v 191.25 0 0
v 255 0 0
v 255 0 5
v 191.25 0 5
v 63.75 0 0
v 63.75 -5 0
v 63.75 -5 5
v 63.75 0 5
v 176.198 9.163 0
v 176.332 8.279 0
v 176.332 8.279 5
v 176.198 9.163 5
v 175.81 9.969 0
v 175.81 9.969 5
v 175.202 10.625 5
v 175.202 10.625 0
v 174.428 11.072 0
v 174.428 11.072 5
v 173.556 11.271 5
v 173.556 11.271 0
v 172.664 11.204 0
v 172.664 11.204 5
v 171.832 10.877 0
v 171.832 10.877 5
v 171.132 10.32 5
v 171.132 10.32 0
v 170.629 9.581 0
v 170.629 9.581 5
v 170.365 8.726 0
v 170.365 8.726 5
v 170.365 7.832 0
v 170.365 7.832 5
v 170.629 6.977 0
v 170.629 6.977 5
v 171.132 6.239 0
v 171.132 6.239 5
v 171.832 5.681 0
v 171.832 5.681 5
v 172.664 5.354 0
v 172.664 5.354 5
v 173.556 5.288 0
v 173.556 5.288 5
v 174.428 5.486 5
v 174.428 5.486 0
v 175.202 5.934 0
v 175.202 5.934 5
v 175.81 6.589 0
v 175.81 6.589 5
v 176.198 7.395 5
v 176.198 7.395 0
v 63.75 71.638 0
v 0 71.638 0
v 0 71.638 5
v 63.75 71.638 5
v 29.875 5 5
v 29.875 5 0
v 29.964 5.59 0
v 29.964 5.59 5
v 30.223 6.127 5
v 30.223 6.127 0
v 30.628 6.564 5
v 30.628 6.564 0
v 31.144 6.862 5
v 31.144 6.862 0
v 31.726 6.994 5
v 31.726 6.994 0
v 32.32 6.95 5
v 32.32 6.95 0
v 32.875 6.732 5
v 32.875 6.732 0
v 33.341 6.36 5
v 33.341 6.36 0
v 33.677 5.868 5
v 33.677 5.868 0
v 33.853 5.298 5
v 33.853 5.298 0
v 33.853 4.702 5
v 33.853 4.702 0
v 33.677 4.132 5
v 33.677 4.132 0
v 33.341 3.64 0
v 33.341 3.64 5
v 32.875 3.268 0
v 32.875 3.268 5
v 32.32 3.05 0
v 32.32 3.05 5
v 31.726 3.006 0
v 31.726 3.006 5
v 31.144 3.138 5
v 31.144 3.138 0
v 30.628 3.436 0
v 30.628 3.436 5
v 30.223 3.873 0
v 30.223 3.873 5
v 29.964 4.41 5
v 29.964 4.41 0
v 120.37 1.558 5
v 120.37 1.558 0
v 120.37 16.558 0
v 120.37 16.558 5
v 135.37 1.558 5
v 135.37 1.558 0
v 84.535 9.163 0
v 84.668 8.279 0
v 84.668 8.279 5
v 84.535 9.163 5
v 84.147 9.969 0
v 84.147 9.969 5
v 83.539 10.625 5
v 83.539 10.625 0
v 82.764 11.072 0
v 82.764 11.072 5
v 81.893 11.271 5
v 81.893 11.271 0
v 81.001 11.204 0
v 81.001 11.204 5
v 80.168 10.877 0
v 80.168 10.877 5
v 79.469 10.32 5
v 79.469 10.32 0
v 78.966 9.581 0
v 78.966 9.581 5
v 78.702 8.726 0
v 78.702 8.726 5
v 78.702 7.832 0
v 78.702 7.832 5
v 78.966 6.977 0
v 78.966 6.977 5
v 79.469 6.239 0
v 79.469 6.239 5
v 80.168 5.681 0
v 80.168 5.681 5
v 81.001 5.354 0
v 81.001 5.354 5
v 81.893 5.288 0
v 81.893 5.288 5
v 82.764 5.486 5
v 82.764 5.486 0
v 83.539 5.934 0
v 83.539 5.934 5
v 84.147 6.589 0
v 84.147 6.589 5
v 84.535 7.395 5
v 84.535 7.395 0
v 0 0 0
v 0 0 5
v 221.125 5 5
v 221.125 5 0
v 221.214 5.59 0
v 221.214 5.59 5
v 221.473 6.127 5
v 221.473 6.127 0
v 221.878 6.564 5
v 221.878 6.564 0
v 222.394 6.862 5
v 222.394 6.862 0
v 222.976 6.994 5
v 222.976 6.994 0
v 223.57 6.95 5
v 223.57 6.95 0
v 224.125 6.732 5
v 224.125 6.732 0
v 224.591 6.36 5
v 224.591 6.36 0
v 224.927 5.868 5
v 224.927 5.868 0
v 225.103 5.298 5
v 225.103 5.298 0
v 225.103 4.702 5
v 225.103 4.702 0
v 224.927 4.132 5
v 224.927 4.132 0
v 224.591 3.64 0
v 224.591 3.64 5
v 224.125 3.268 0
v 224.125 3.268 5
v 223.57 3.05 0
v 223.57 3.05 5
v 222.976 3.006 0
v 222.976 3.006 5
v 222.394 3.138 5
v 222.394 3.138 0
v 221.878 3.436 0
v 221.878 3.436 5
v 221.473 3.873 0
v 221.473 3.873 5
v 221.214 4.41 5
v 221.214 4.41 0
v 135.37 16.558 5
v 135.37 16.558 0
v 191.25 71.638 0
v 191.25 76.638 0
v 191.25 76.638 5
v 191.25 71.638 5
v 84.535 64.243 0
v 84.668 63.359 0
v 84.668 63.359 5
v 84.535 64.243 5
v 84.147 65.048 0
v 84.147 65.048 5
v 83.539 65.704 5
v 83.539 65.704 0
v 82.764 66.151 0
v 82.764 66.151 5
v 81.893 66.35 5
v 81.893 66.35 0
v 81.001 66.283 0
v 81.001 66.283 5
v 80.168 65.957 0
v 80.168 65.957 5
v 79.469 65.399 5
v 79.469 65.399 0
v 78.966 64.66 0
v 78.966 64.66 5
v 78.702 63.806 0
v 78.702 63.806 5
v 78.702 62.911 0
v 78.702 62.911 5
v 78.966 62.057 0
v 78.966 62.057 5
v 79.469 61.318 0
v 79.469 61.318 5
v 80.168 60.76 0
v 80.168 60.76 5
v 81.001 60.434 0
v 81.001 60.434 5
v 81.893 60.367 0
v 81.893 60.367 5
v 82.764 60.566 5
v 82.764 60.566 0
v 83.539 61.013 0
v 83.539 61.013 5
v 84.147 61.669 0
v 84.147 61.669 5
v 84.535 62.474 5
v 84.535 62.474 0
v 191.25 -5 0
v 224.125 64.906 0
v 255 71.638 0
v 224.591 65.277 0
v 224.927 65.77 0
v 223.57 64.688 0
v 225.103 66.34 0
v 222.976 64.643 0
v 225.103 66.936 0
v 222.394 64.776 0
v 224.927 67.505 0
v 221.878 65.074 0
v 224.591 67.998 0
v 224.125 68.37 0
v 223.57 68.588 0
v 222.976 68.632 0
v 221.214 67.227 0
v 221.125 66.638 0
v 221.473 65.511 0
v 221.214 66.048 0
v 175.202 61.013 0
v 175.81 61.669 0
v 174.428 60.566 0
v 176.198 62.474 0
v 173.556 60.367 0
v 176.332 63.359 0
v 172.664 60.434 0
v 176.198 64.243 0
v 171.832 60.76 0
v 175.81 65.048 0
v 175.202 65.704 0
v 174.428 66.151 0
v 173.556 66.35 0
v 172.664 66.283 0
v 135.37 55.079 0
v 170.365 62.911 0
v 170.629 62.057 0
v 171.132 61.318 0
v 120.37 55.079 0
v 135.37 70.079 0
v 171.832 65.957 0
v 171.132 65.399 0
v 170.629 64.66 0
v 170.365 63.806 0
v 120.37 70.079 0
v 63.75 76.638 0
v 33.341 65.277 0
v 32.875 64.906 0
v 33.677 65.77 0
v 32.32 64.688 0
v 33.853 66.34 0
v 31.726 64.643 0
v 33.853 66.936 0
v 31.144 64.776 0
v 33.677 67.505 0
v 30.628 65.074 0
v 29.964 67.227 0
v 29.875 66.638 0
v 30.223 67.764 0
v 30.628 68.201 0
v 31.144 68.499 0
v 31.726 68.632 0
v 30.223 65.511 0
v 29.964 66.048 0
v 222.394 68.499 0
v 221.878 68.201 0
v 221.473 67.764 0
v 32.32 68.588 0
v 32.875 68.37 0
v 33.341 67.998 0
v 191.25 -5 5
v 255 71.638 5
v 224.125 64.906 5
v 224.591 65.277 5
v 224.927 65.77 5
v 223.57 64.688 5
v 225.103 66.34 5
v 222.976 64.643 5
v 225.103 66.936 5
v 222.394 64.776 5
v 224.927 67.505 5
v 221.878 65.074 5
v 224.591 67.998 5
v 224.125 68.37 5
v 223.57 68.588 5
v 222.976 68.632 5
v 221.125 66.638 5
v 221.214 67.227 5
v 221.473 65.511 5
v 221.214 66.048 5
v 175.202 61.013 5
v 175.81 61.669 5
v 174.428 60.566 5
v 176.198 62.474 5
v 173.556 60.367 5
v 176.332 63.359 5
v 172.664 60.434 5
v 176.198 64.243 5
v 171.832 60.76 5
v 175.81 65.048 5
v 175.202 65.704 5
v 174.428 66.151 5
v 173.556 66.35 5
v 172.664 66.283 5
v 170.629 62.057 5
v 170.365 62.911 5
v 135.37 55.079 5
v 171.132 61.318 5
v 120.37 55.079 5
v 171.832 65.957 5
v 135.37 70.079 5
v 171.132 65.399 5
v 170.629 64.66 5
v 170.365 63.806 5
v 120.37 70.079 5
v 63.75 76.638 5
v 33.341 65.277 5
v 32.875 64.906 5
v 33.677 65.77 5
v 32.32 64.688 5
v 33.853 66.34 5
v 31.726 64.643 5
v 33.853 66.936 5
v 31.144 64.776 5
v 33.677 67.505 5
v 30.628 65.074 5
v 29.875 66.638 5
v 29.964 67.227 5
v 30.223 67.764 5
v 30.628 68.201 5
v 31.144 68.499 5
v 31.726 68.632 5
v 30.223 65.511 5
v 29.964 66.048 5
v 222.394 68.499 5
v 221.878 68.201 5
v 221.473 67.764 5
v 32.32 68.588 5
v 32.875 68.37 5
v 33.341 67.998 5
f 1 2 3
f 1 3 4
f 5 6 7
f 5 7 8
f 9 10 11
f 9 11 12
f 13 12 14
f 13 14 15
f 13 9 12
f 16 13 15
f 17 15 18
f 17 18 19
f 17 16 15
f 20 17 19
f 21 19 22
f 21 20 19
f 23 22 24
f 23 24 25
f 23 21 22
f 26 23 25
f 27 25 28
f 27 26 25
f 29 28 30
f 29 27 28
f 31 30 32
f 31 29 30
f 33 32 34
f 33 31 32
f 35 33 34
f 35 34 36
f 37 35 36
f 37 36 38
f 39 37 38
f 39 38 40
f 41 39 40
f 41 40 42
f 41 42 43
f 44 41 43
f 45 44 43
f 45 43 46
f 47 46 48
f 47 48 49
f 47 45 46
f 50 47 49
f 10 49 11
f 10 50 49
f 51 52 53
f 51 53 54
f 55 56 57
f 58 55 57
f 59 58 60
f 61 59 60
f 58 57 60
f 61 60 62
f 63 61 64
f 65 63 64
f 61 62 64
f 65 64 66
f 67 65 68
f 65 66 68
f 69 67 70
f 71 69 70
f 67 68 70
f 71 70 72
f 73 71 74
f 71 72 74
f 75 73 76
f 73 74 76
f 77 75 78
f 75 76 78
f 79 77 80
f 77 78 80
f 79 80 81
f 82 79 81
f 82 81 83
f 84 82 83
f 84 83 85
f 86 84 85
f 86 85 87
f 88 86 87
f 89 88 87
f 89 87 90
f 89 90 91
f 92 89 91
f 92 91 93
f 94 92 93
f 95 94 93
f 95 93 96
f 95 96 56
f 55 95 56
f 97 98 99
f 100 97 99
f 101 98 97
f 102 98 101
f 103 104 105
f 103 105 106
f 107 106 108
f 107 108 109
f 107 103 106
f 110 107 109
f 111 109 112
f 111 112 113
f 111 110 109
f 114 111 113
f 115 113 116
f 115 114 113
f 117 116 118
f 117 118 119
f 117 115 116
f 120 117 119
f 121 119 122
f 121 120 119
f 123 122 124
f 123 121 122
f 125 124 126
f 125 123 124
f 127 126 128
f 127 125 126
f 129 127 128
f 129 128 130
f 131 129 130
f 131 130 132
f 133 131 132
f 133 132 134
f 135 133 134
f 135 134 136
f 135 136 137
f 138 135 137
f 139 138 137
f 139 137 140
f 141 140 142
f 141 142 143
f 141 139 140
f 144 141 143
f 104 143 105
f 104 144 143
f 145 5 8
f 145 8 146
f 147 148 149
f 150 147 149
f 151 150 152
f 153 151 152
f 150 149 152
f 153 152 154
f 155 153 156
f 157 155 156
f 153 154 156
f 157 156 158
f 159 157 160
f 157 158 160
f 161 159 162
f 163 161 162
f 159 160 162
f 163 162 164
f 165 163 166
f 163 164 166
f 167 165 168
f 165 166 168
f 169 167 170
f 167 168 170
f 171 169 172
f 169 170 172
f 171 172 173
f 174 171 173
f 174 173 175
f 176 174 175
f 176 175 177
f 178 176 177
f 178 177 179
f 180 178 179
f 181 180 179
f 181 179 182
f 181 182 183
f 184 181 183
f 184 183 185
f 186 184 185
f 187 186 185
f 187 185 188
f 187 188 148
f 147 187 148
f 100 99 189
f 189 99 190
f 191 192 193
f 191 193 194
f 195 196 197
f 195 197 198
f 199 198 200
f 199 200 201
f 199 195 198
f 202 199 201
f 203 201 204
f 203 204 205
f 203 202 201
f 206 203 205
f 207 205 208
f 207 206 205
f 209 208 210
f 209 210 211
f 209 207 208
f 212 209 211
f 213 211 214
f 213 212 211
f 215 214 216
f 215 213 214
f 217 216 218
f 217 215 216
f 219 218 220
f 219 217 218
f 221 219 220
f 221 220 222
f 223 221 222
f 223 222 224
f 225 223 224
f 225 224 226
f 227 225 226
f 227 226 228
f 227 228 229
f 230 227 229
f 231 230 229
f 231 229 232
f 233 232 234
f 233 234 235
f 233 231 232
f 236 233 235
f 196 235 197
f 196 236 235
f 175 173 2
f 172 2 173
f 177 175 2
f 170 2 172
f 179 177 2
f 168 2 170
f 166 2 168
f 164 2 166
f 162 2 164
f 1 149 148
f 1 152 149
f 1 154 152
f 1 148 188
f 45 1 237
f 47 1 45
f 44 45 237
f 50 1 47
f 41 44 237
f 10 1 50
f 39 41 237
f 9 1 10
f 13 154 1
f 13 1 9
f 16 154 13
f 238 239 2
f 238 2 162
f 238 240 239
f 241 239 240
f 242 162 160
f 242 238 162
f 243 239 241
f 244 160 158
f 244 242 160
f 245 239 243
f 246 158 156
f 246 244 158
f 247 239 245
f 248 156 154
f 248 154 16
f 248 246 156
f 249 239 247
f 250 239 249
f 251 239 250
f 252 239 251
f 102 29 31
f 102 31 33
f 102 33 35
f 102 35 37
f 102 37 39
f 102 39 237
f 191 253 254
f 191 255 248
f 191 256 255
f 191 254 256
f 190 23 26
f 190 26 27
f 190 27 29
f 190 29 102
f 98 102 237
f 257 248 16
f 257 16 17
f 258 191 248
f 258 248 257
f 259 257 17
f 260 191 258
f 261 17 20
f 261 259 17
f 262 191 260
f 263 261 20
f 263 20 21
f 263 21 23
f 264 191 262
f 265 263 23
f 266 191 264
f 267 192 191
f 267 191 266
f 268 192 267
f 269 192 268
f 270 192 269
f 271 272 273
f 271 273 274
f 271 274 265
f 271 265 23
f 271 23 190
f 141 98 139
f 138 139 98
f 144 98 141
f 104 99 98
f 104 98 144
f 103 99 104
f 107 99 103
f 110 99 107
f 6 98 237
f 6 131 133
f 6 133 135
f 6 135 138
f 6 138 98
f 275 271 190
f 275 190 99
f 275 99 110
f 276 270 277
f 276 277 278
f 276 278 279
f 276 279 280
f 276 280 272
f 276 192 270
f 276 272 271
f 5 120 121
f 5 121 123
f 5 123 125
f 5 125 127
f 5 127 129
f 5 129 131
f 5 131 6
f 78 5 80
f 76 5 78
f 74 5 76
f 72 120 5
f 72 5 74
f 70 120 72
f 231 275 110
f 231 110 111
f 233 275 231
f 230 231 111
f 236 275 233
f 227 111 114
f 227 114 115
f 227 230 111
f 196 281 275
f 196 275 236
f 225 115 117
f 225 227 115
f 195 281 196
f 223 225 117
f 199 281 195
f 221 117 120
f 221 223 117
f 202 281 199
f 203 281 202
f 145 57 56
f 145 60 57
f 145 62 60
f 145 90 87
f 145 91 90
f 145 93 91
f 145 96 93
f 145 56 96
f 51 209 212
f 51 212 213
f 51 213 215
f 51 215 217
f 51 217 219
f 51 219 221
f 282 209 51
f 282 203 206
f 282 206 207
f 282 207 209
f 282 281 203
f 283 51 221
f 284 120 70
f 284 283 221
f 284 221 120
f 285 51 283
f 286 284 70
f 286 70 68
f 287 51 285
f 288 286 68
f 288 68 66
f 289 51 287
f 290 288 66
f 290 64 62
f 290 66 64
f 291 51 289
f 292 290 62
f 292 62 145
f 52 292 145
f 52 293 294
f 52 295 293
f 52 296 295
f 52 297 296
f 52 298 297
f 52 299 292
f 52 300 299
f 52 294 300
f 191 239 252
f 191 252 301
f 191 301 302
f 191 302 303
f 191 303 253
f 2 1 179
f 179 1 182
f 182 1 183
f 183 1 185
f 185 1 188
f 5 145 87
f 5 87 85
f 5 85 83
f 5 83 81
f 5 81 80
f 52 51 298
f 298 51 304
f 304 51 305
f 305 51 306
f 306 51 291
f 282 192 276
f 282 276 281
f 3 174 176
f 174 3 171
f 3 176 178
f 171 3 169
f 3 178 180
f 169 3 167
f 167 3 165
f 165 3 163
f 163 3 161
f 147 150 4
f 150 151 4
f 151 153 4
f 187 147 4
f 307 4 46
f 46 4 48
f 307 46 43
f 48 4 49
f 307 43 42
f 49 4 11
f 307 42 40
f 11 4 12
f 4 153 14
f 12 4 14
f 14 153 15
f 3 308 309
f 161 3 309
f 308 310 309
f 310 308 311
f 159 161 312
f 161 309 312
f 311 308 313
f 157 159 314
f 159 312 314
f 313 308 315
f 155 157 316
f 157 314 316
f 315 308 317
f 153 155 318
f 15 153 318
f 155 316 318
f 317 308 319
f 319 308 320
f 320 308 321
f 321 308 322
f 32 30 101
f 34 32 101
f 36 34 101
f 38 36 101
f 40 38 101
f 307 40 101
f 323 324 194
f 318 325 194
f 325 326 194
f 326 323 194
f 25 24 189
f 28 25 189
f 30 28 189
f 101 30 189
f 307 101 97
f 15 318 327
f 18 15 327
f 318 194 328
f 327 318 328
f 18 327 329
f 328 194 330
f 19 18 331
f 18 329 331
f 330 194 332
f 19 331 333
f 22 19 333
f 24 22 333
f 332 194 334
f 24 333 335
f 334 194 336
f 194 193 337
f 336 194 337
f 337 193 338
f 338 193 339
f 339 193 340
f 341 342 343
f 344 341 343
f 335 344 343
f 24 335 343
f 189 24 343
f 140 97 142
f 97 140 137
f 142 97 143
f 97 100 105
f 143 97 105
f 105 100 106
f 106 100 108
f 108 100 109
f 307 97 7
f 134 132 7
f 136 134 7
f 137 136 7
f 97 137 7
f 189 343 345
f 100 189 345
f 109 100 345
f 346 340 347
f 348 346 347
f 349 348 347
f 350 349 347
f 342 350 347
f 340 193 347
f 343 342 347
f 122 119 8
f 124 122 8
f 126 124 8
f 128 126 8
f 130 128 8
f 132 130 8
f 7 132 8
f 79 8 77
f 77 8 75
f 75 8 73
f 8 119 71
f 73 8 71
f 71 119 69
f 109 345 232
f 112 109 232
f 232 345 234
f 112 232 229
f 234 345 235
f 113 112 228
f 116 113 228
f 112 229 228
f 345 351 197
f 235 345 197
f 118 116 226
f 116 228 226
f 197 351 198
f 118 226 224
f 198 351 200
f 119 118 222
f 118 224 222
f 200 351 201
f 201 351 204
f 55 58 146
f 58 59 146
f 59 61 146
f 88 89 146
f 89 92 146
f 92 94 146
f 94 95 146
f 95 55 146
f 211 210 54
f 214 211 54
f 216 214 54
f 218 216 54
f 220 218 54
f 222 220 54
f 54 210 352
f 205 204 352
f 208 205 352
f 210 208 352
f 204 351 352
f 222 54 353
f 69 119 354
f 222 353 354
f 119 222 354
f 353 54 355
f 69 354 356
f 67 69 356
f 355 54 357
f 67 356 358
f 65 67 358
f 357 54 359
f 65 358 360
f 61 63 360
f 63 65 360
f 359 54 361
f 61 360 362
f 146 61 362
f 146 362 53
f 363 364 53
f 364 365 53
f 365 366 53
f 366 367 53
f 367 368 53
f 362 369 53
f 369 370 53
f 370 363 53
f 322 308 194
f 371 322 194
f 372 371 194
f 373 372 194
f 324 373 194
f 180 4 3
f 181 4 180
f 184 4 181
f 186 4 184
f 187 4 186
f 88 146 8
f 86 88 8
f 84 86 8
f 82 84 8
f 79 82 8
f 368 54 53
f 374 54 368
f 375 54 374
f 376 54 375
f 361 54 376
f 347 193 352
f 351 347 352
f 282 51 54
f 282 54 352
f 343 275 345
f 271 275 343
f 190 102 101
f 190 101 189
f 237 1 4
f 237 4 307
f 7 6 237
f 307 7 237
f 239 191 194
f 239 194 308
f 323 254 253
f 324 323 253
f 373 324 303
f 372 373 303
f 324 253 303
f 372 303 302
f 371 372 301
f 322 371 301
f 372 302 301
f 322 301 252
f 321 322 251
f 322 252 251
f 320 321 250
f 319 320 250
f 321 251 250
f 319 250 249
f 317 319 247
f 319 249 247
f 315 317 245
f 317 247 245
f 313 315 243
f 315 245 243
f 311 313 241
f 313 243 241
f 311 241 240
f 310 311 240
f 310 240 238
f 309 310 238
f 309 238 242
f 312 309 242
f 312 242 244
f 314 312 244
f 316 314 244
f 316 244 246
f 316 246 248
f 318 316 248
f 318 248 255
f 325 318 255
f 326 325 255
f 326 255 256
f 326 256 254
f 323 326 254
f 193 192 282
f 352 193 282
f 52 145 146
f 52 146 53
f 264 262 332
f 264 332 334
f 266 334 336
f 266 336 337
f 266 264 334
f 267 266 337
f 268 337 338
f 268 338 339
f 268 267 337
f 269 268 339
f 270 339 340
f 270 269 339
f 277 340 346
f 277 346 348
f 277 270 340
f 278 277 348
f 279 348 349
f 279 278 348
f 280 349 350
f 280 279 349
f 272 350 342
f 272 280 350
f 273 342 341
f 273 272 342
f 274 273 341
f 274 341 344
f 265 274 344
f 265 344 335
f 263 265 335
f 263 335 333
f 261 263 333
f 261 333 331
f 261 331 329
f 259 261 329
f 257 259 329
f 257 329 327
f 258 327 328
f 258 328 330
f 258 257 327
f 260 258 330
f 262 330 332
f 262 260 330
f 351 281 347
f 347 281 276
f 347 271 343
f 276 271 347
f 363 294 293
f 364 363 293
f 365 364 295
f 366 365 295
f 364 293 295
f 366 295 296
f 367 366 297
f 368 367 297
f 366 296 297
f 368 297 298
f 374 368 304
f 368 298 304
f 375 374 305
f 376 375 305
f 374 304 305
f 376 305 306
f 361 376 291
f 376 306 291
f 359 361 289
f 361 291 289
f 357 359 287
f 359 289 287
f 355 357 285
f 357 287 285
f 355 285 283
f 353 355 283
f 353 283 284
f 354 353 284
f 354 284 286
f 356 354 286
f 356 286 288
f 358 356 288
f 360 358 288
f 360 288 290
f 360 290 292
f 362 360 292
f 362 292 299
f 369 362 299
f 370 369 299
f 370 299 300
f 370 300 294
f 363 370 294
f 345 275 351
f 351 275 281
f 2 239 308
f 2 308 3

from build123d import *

# Parameters (mm, degrees)
SKETCH1_R           = 3
SKETCH1_W           = 15
SKETCH1_H           = 15
BOSS_EXTRUDE1_DEPTH = 5
SKETCH2_R           = 1.5
CUT_EXTRUDE1_DEPTH  = 185
SKETCH3_R           = 2
CUT_EXTRUDE2_DEPTH  = 10


with BuildPart() as part:
    # Sketch1 → Boss-Extrude1 (new body)
    with BuildSketch(Plane.XY):
        Polygon((191.25, 71.637645579), (255, 71.637645579), (255, 0), (191.25, 0), (191.25, -5), (127.5, -5), (63.75, -5), (63.75, 0), (0, 0), (0, 71.637645579), (63.75, 71.637645579), (63.75, 76.637645579), (127.5, 76.637645579), (191.25, 76.637645579), align=None)
        with Locations((81.6684273, 63.35852795)):
            Circle(SKETCH1_R, mode=Mode.SUBTRACT)
        with Locations((173.3315727, 63.35852795)):
            Circle(SKETCH1_R, mode=Mode.SUBTRACT)
        with Locations((81.6684273, 8.27911763)):
            Circle(SKETCH1_R, mode=Mode.SUBTRACT)
        with Locations((173.3315727, 8.27911763)):
            Circle(SKETCH1_R, mode=Mode.SUBTRACT)
        with Locations((127.870410973, 62.57941032)):
            Rectangle(SKETCH1_W, SKETCH1_H, mode=Mode.SUBTRACT)
        with Locations((127.870410973, 9.058235259)):
            Rectangle(SKETCH1_W, SKETCH1_H, mode=Mode.SUBTRACT)
    extrude(amount=BOSS_EXTRUDE1_DEPTH)

    # Sketch2 → Cut-Extrude1 (cut)
    with BuildSketch(Plane(origin=(0, 0, 0), x_dir=(-1, 0, 0), z_dir=(0, 0, -1))):
        with Locations((-31.875, 5)):
            Circle(SKETCH2_R)
        with Locations((-31.875, 66.637645579)):
            Circle(SKETCH2_R)
        with Locations((-223.125, 66.637645579)):
            Circle(SKETCH2_R)
        with Locations((-223.125, 5)):
            Circle(SKETCH2_R)
    extrude(amount=-CUT_EXTRUDE1_DEPTH, mode=Mode.SUBTRACT)

    # Sketch3 → Cut-Extrude2 (cut)
    with BuildSketch(Plane(origin=(0, 0, 0), x_dir=(-1, 0, 0), z_dir=(0, 0, -1))):
        with Locations((-31.875, 5)):
            Circle(SKETCH3_R)
        with Locations((-31.875, 66.637645579)):
            Circle(SKETCH3_R)
        with Locations((-223.125, 5)):
            Circle(SKETCH3_R)
        with Locations((-223.125, 66.637645579)):
            Circle(SKETCH3_R)
    extrude(amount=-CUT_EXTRUDE2_DEPTH, mode=Mode.SUBTRACT)


solid = part.part
